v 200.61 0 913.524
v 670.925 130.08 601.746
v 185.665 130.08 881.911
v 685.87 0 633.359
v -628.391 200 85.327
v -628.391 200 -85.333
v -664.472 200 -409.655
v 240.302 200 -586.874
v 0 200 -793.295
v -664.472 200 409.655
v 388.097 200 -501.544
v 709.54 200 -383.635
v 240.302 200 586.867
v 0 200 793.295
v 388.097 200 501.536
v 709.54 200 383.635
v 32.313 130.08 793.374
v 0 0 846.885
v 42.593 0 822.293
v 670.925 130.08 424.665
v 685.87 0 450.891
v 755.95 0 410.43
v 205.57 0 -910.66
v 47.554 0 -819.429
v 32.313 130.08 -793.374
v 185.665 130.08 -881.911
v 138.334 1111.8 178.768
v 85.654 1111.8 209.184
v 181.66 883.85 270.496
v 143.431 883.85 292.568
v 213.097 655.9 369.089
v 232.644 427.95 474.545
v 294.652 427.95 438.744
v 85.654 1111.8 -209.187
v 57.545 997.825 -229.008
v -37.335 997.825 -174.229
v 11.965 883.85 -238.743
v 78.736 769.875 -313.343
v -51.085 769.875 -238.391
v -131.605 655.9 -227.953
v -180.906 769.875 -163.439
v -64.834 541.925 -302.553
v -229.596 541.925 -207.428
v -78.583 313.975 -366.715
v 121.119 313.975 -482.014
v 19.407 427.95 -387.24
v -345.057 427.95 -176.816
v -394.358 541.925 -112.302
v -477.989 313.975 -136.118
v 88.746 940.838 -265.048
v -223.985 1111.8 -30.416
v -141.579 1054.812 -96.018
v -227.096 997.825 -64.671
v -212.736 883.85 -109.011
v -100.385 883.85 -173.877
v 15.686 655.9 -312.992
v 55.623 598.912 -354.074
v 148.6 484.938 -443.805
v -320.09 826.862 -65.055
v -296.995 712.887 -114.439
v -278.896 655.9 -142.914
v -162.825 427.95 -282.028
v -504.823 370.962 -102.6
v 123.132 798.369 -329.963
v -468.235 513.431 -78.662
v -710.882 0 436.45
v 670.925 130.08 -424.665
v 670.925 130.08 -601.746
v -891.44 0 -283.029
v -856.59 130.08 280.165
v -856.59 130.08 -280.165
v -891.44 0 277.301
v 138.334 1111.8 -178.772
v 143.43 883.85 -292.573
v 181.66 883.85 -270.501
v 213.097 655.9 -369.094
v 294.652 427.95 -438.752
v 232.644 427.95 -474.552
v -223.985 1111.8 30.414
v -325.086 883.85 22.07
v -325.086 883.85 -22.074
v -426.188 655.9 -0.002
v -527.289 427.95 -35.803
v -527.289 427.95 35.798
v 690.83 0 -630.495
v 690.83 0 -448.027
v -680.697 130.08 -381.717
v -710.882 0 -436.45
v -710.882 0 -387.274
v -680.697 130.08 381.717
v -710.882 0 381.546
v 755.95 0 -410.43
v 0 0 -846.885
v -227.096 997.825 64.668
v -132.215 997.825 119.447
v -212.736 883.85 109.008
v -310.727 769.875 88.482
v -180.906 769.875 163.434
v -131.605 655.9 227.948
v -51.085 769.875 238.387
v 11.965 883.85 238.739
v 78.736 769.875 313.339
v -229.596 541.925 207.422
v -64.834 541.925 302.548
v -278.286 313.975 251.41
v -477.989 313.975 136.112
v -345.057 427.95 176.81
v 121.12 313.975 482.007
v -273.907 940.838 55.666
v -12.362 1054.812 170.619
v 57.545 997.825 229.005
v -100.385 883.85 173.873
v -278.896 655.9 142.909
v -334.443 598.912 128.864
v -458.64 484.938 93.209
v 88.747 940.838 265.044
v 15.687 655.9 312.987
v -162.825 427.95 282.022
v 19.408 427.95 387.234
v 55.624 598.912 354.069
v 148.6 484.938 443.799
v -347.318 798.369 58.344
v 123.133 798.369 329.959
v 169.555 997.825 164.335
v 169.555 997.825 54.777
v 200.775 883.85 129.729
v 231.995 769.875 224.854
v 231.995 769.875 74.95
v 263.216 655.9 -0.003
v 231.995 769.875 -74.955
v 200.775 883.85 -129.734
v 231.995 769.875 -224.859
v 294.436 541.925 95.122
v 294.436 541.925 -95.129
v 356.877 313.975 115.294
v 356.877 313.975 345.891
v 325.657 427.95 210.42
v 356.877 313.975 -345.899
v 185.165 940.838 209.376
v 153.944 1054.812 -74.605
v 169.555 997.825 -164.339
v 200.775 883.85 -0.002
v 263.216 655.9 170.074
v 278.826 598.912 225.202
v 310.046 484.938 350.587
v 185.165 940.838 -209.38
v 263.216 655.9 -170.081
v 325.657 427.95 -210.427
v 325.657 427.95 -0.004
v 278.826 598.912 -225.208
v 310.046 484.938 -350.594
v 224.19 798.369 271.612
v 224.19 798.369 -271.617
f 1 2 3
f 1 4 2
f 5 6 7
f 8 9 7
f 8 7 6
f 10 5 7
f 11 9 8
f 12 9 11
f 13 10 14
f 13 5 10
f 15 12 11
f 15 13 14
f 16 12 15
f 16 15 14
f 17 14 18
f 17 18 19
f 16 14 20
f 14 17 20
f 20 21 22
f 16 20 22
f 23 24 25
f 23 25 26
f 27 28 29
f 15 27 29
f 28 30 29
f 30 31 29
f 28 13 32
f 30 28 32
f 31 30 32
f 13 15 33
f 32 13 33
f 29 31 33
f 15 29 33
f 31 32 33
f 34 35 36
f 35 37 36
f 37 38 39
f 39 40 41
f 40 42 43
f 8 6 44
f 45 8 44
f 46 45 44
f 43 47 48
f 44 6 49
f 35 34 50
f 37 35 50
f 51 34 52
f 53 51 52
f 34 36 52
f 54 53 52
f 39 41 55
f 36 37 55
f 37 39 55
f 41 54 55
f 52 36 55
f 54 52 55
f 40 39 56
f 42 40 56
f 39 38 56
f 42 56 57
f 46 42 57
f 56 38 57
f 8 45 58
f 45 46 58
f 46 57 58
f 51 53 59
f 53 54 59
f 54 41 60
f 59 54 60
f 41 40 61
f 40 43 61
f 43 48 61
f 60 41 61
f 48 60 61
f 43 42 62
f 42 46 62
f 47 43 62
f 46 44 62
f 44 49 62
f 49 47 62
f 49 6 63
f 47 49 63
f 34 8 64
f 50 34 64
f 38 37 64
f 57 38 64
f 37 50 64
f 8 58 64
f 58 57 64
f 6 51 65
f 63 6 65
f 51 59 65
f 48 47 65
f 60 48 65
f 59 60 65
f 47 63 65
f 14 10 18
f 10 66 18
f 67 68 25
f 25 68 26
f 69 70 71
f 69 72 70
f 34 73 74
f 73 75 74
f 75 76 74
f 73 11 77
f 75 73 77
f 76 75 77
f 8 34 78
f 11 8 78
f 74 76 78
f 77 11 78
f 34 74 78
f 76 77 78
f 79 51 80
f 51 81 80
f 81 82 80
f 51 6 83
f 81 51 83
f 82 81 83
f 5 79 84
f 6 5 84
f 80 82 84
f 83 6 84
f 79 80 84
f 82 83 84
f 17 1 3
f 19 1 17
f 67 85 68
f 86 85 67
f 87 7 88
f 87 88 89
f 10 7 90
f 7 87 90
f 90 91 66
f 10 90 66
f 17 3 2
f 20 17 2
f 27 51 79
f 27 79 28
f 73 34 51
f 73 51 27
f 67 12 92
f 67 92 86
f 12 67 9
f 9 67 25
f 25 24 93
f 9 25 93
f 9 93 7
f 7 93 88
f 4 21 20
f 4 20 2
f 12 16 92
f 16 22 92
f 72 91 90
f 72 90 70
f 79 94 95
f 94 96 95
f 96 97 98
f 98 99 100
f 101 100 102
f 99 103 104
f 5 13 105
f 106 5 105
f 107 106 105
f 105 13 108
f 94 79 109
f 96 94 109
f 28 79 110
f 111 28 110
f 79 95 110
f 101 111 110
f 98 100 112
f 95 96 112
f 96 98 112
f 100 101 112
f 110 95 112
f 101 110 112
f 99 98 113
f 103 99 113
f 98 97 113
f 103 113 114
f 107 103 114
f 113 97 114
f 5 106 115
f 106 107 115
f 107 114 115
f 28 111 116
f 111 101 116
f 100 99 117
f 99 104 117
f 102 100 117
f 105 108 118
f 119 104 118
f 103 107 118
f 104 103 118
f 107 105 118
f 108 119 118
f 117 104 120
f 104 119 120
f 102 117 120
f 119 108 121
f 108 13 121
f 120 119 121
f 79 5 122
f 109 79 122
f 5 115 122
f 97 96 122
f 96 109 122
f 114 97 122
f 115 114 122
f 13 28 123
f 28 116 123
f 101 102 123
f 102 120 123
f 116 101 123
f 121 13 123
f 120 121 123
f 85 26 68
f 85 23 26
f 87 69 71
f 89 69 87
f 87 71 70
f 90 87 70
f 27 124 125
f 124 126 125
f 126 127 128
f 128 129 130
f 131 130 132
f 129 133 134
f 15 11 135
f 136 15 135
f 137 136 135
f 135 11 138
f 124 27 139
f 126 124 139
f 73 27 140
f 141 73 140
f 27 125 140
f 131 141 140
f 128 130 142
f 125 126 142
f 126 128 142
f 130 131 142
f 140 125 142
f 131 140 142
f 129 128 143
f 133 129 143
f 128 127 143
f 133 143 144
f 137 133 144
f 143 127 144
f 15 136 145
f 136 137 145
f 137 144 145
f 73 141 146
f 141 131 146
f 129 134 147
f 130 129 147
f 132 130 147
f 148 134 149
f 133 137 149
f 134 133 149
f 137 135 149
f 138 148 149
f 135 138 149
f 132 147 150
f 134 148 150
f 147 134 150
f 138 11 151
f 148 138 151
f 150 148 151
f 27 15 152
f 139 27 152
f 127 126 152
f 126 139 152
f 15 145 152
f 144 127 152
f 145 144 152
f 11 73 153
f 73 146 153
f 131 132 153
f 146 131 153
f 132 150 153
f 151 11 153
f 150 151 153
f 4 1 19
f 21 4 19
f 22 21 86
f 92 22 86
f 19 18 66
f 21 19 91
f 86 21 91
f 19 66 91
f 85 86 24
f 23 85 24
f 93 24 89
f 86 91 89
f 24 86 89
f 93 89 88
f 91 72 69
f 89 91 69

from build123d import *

# Parameters (mm, degrees)
PATTERN_CIRCULAR_1_COUNT = 3


with BuildPart() as part:
    # 草图4 → 放样5 section 0
    with BuildSketch(Plane(origin=(0, 200, 0), x_dir=(1, 0, 0), z_dir=(0, 1, 0))):
        Polygon((0, 793.295), (-664.472424785, 409.655), (-664.472424785, -409.655), (0, -793.295), (709.5403868, -383.635), (709.5403868, 383.635), align=None)
    # 草图1 → 放样5 section 1
    with BuildSketch(Plane(origin=(0, 0, 0), x_dir=(1, 0, 0), z_dir=(0, 1, 0))):
        Polygon((-710.882424785, -436.449593178), (-1.2807e-05, -846.88487741), (755.9503868, -410.429607966), (755.9503868, 410.429607966), (-1.2807e-05, 846.88487741), (-710.882424785, 436.449593178), align=None)
    loft()

    # 草图8 → 放样8 section 0
    with BuildSketch(Plane(origin=(0, 130.08, 0), x_dir=(1, 0, 0), z_dir=(0, 1, 0))):
        Polygon((-676.032424785, 384.41), (-676.032424785, -384.41), (-856.59006122, -280.165), (-856.59006122, 280.165), align=None)
    # 草图7 → 放样8 section 1
    with BuildSketch(Plane(origin=(0, 0, 0), x_dir=(1, 0, 0), z_dir=(0, 1, 0))):
        Polygon((-710.882424785, 387.274170973), (-891.44006122, 283.029170973), (-891.44006122, -277.300829027), (-710.882424785, -381.545829027), align=None)
    loft_8 = loft()

    # 阵列(圆周)1: 放样8 ×3 about axis
    pattern_circular_1_axis = Axis((0, 0, 0), (0, 1, 0))
    for i in range(1, PATTERN_CIRCULAR_1_COUNT):
        add(loft_8.rotate(pattern_circular_1_axis, i * 360 / PATTERN_CIRCULAR_1_COUNT))

    # 草图11 → 放样9 section 0
    with BuildSketch(Plane(origin=(0, 1111.8, 0), x_dir=(1, 0, 0), z_dir=(0, 1, 0))):
        Polygon((-223.984859664, 30.416313823), (-223.984859664, -30.413899524), (85.653863205, -209.183899524), (138.334158952, -178.768421621), (138.334158952, 178.771578379), (85.653648875, 209.186685053), align=None)
    # 草图10 → 放样9 section 1
    with BuildSketch(Plane(origin=(0, 200, 0), x_dir=(1, 0, 0), z_dir=(0, 1, 0))):
        Polygon((240.301512133, 586.87442815), (388.097407543, 501.54442815), (388.097407543, -501.53557185), (240.30211344, -586.866613336), (-628.39064859, -85.32661334), (-628.39064859, 85.33338666), align=None)
    loft()


solid = part.part
